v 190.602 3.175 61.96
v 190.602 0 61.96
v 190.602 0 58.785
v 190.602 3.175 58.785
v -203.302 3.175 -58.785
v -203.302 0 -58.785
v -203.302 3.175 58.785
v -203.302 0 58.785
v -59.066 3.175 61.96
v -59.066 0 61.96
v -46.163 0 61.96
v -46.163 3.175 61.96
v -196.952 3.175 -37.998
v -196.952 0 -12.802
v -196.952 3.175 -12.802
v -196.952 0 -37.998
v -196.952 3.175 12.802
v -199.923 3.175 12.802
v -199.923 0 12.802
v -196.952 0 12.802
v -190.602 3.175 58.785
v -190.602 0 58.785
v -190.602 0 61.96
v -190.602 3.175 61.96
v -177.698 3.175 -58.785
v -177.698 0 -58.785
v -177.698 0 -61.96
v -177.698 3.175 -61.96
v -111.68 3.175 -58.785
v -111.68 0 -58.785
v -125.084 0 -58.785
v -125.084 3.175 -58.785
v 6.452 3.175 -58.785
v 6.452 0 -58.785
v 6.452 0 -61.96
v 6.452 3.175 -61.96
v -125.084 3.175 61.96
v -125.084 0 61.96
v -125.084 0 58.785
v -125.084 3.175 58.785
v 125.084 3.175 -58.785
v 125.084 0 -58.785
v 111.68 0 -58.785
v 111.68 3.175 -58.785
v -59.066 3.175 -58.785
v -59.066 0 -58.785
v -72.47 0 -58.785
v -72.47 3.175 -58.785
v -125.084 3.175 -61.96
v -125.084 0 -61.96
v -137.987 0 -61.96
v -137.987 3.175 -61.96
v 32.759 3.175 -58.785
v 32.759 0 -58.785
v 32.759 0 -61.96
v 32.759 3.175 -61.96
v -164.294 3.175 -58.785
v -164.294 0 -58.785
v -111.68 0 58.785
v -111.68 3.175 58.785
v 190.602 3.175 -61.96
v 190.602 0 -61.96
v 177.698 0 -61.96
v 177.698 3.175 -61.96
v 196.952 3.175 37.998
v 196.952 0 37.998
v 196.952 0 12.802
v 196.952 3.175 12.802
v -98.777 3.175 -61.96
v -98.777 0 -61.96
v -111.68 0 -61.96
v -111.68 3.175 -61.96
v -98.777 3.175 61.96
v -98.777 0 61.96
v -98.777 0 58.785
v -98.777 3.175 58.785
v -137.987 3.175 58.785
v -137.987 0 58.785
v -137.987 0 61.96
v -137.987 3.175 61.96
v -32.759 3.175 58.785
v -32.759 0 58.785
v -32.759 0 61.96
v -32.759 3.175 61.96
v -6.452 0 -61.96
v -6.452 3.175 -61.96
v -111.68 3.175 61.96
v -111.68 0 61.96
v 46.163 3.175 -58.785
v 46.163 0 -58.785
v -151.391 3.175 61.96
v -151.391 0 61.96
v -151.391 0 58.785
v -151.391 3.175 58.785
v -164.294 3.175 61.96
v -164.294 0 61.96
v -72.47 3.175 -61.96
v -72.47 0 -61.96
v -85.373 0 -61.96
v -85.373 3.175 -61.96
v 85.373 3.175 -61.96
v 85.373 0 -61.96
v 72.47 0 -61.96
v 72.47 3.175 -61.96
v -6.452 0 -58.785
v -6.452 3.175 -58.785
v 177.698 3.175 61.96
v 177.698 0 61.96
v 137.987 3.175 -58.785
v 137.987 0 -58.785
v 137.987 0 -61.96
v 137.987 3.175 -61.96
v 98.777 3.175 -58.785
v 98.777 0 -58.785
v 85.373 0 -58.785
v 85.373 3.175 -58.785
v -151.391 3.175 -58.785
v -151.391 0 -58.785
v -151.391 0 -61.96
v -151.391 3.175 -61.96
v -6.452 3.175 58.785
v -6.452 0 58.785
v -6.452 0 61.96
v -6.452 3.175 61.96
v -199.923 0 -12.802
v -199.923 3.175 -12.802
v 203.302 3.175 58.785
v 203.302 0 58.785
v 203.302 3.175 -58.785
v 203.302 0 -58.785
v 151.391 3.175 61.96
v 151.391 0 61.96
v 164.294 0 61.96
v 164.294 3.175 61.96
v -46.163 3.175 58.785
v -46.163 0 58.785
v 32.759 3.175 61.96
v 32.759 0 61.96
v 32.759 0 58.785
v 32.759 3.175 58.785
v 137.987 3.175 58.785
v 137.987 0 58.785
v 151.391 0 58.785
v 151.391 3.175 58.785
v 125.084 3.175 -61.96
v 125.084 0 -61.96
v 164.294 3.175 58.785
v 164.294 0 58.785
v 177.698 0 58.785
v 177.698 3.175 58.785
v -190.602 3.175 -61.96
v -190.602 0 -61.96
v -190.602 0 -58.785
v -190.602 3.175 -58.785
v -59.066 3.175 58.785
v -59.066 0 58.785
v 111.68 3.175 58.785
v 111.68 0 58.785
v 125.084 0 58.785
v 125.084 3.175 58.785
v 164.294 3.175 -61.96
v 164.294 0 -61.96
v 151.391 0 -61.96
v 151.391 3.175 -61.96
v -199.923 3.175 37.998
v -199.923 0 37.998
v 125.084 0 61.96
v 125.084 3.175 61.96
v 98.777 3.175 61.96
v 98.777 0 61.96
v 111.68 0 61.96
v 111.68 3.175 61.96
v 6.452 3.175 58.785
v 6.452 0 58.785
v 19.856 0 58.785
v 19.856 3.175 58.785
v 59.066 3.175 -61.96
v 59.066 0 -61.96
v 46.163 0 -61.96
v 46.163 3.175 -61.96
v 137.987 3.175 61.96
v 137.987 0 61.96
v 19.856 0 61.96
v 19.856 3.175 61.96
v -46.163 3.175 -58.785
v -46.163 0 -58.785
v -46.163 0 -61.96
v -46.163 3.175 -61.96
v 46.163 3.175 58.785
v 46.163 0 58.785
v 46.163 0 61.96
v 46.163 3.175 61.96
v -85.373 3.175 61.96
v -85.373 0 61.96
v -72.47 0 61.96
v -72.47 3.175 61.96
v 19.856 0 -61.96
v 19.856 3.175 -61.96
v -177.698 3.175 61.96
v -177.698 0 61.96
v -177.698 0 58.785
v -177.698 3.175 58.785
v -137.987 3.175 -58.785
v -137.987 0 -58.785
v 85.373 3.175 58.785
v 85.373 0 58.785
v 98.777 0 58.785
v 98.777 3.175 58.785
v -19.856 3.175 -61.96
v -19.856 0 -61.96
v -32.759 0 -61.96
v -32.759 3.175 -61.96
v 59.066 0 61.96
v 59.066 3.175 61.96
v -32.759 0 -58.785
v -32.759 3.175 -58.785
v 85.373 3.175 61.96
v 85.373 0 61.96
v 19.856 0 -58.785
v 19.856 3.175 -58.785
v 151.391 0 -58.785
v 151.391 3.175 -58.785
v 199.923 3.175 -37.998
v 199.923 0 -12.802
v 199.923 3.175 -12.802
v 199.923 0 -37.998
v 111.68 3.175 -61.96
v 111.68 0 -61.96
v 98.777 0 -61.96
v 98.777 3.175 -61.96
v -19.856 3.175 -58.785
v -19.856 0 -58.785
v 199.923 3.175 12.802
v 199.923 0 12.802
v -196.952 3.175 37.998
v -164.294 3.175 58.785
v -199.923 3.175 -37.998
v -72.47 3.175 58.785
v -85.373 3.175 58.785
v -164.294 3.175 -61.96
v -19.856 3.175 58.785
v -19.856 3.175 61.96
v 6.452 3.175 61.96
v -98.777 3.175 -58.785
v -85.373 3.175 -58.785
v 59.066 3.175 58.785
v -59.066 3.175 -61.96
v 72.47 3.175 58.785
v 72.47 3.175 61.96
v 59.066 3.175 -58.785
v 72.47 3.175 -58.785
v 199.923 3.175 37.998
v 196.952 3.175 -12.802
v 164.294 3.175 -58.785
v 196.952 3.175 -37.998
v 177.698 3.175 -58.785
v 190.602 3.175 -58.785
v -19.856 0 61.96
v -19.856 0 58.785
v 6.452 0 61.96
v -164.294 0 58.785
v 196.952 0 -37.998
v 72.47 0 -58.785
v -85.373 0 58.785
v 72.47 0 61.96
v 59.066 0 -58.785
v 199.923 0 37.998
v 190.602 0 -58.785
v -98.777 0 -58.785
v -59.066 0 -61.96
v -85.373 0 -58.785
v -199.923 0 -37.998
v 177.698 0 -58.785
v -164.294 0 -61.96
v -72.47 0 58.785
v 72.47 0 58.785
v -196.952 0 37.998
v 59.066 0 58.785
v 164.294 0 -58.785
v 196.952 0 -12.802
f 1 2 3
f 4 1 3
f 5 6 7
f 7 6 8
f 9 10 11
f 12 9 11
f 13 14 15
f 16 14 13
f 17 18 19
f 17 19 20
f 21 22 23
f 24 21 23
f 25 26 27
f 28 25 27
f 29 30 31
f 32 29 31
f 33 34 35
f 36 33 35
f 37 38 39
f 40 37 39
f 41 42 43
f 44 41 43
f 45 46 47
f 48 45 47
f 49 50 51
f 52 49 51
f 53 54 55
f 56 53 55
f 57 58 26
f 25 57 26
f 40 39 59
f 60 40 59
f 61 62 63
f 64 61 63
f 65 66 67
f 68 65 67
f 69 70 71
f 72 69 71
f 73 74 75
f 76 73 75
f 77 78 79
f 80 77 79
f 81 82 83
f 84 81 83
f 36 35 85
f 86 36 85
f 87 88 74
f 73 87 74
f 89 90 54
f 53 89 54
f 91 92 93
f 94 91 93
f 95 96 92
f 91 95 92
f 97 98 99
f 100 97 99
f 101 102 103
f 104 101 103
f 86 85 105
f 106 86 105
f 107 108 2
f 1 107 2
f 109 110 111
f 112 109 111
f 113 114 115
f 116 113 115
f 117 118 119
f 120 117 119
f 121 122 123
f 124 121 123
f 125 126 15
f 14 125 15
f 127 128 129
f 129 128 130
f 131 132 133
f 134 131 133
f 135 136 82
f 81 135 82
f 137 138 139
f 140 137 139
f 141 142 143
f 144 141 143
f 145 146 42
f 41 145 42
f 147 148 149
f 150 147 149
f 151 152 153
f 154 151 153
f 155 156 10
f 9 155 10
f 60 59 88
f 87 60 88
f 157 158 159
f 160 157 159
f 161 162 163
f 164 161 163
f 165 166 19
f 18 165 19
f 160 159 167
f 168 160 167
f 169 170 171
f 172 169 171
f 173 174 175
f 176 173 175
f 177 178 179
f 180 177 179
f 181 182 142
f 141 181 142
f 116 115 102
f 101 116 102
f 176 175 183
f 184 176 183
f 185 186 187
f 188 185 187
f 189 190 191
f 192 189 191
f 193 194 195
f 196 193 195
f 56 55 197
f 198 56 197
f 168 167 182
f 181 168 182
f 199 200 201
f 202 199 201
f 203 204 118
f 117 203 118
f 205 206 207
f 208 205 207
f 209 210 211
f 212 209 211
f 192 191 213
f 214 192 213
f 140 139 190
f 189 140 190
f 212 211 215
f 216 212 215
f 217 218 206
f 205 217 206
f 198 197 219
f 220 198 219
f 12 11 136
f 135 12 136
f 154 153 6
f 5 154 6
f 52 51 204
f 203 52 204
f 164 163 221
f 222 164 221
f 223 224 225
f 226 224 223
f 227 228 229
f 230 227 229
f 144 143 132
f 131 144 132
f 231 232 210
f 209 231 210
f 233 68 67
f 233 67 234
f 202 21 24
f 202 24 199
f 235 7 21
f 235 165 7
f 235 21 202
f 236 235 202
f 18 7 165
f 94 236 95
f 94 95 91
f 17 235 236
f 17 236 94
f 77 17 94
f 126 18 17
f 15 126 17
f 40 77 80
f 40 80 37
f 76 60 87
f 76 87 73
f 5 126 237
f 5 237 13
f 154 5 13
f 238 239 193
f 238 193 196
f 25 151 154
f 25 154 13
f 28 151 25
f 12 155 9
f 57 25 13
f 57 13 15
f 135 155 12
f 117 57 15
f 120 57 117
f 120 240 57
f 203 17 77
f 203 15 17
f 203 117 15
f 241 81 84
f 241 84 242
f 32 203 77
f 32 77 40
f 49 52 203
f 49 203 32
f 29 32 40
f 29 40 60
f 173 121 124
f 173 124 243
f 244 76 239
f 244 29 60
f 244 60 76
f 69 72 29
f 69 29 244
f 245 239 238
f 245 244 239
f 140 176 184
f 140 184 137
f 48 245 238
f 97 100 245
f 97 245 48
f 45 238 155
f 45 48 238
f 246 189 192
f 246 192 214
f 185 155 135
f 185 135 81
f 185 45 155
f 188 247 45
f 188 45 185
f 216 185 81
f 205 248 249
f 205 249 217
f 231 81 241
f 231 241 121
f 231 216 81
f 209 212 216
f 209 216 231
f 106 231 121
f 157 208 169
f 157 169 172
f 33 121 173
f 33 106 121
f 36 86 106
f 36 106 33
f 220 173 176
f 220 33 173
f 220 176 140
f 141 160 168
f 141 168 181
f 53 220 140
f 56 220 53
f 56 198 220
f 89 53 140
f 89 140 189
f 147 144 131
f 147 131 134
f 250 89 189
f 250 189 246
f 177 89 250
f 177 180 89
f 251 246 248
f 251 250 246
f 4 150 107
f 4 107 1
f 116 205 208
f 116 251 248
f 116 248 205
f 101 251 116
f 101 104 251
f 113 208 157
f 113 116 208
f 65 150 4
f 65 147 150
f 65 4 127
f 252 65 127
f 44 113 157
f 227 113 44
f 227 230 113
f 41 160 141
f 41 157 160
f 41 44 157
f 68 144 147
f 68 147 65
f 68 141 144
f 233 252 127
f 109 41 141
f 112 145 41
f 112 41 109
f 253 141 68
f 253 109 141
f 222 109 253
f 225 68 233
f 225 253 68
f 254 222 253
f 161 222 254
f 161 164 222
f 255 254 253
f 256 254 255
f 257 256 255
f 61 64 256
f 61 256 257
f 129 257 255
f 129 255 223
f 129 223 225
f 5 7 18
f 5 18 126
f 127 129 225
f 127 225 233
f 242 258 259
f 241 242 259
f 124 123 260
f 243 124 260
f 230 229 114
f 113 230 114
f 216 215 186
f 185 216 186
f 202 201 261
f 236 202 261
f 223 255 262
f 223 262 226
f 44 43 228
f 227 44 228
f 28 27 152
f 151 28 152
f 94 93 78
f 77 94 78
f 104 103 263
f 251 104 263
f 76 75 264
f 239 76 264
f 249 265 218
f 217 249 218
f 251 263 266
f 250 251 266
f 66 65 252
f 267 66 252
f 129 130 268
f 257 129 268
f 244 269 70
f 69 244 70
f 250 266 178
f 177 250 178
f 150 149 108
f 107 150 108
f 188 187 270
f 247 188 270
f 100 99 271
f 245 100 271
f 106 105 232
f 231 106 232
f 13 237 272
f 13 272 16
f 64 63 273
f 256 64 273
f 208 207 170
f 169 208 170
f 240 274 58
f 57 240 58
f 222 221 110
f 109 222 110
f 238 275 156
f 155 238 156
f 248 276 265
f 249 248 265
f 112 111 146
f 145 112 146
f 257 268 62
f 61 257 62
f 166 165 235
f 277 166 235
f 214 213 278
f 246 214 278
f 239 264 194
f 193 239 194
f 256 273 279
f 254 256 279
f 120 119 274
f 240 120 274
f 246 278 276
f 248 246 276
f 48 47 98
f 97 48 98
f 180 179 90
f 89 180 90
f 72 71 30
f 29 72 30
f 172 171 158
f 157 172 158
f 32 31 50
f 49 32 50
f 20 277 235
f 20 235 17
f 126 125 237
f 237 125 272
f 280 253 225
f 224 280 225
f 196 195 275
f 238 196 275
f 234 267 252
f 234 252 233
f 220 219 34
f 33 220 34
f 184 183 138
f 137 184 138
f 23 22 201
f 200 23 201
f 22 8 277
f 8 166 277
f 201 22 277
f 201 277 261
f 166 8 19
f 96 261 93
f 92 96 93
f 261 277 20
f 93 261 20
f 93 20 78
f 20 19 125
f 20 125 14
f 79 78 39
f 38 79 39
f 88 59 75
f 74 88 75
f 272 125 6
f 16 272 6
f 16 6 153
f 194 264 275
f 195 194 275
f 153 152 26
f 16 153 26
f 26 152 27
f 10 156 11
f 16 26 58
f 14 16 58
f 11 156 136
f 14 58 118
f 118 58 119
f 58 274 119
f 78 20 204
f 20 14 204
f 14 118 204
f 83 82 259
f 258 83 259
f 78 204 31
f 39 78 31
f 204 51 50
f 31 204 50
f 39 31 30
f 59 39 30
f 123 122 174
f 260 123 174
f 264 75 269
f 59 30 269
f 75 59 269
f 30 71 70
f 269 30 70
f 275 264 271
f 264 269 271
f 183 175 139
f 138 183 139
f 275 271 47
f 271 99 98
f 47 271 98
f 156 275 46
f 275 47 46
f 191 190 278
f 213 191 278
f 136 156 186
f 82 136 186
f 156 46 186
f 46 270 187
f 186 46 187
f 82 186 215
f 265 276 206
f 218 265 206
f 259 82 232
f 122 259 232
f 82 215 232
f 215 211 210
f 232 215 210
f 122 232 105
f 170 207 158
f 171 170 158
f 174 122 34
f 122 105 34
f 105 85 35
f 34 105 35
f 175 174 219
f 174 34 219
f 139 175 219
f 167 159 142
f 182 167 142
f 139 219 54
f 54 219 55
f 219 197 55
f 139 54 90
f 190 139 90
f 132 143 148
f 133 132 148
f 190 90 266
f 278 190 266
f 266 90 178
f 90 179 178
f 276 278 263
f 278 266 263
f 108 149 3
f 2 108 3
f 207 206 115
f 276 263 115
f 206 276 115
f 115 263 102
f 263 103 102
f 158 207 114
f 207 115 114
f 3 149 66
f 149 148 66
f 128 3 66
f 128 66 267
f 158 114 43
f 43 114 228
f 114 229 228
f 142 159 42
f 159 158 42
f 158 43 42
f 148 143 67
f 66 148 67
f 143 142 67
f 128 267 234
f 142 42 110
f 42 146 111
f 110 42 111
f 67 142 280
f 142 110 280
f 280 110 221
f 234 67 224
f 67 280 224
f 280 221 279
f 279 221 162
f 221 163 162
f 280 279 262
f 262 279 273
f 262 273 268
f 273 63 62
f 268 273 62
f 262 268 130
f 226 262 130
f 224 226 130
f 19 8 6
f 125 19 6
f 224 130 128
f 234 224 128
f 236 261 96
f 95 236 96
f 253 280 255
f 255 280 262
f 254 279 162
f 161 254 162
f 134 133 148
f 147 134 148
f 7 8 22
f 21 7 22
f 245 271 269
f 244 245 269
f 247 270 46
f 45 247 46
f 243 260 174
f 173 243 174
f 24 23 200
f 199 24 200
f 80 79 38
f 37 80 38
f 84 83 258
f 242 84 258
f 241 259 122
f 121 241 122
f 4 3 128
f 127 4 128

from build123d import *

# Parameters (mm, degrees)
SKETCH1_W           = 2.9718
SKETCH1_H           = 25.1968
BOSS_EXTRUDE1_DEPTH = 3.175


with BuildPart() as part:
    # Sketch1 → Boss-Extrude1 (new body)
    with BuildSketch(Plane(origin=(0, 0, 0), x_dir=(1, 0, 0), z_dir=(0, 1, 0))):
        Polygon((-137.987314286, 58.785125), (-151.391257143, 58.785125), (-151.391257143, 61.960125), (-164.294457143, 61.960125), (-164.294457143, 58.785125), (-177.6984, 58.785125), (-177.6984, 61.960125), (-190.6016, 61.960125), (-190.6016, 58.785125), (-203.3016, 58.785125), (-203.3016, -58.785125), (-190.6016, -58.785125), (-190.6016, -61.960125), (-177.6984, -61.960125), (-177.6984, -58.785125), (-164.294457143, -58.785125), (-164.294457143, -61.960125), (-151.391257143, -61.960125), (-151.391257143, -58.785125), (-137.987314286, -58.785125), (-137.987314286, -61.960125), (-125.084114286, -61.960125), (-125.084114286, -58.785125), (-111.680171429, -58.785125), (-111.680171429, -61.960125), (-98.776971429, -61.960125), (-98.776971429, -58.785125), (-85.373028571, -58.785125), (-85.373028571, -61.960125), (-72.469828571, -61.960125), (-72.469828571, -58.785125), (-59.065885714, -58.785125), (-59.065885714, -61.960125), (-46.162685714, -61.960125), (-46.162685714, -58.785125), (-32.758742857, -58.785125), (-32.758742857, -61.960125), (-19.855542857, -61.960125), (-19.855542857, -58.785125), (-6.4516, -58.785125), (-6.4516, -61.960125), (6.4516, -61.960125), (6.4516, -58.785125), (19.855542857, -58.785125), (19.855542857, -61.960125), (32.758742857, -61.960125), (32.758742857, -58.785125), (46.162685714, -58.785125), (46.162685714, -61.960125), (59.065885714, -61.960125), (59.065885714, -58.785125), (72.469828571, -58.785125), (72.469828571, -61.960125), (85.373028571, -61.960125), (85.373028571, -58.785125), (98.776971429, -58.785125), (98.776971429, -61.960125), (111.680171429, -61.960125), (111.680171429, -58.785125), (125.084114286, -58.785125), (125.084114286, -61.960125), (137.987314286, -61.960125), (137.987314286, -58.785125), (151.391257143, -58.785125), (151.391257143, -61.960125), (164.294457143, -61.960125), (164.294457143, -58.785125), (177.6984, -58.785125), (177.6984, -61.960125), (190.6016, -61.960125), (190.6016, -58.785125), (203.3016, -58.785125), (203.3016, 58.785125), (190.6016, 58.785125), (190.6016, 61.960125), (177.6984, 61.960125), (177.6984, 58.785125), (164.294457143, 58.785125), (164.294457143, 61.960125), (151.391257143, 61.960125), (151.391257143, 58.785125), (137.987314286, 58.785125), (137.987314286, 61.960125), (125.084114286, 61.960125), (125.084114286, 58.785125), (111.680171429, 58.785125), (111.680171429, 61.960125), (98.776971429, 61.960125), (98.776971429, 58.785125), (85.373028571, 58.785125), (85.373028571, 61.960125), (72.469828571, 61.960125), (72.469828571, 58.785125), (59.065885714, 58.785125), (59.065885714, 61.960125), (46.162685714, 61.960125), (46.162685714, 58.785125), (32.758742857, 58.785125), (32.758742857, 61.960125), (19.855542857, 61.960125), (19.855542857, 58.785125), (6.4516, 58.785125), (6.4516, 61.960125), (-6.4516, 61.960125), (-6.4516, 58.785125), (-19.855542857, 58.785125), (-19.855542857, 61.960125), (-32.758742857, 61.960125), (-32.758742857, 58.785125), (-46.162685714, 58.785125), (-46.162685714, 61.960125), (-59.065885714, 61.960125), (-59.065885714, 58.785125), (-72.469828571, 58.785125), (-72.469828571, 61.960125), (-85.373028571, 61.960125), (-85.373028571, 58.785125), (-98.776971429, 58.785125), (-98.776971429, 61.960125), (-111.680171429, 61.960125), (-111.680171429, 58.785125), (-125.084114286, 58.785125), (-125.084114286, 61.960125), (-137.987314286, 61.960125), align=None)
        with Locations((-198.4375, 25.4)):
            Rectangle(SKETCH1_W, SKETCH1_H, mode=Mode.SUBTRACT)
        with Locations((-198.4375, -25.4)):
            Rectangle(SKETCH1_W, SKETCH1_H, mode=Mode.SUBTRACT)
        with Locations((198.4375, 25.4)):
            Rectangle(SKETCH1_W, SKETCH1_H, mode=Mode.SUBTRACT)
        with Locations((198.4375, -25.4)):
            Rectangle(SKETCH1_W, SKETCH1_H, mode=Mode.SUBTRACT)
    extrude(amount=BOSS_EXTRUDE1_DEPTH)


solid = part.part
